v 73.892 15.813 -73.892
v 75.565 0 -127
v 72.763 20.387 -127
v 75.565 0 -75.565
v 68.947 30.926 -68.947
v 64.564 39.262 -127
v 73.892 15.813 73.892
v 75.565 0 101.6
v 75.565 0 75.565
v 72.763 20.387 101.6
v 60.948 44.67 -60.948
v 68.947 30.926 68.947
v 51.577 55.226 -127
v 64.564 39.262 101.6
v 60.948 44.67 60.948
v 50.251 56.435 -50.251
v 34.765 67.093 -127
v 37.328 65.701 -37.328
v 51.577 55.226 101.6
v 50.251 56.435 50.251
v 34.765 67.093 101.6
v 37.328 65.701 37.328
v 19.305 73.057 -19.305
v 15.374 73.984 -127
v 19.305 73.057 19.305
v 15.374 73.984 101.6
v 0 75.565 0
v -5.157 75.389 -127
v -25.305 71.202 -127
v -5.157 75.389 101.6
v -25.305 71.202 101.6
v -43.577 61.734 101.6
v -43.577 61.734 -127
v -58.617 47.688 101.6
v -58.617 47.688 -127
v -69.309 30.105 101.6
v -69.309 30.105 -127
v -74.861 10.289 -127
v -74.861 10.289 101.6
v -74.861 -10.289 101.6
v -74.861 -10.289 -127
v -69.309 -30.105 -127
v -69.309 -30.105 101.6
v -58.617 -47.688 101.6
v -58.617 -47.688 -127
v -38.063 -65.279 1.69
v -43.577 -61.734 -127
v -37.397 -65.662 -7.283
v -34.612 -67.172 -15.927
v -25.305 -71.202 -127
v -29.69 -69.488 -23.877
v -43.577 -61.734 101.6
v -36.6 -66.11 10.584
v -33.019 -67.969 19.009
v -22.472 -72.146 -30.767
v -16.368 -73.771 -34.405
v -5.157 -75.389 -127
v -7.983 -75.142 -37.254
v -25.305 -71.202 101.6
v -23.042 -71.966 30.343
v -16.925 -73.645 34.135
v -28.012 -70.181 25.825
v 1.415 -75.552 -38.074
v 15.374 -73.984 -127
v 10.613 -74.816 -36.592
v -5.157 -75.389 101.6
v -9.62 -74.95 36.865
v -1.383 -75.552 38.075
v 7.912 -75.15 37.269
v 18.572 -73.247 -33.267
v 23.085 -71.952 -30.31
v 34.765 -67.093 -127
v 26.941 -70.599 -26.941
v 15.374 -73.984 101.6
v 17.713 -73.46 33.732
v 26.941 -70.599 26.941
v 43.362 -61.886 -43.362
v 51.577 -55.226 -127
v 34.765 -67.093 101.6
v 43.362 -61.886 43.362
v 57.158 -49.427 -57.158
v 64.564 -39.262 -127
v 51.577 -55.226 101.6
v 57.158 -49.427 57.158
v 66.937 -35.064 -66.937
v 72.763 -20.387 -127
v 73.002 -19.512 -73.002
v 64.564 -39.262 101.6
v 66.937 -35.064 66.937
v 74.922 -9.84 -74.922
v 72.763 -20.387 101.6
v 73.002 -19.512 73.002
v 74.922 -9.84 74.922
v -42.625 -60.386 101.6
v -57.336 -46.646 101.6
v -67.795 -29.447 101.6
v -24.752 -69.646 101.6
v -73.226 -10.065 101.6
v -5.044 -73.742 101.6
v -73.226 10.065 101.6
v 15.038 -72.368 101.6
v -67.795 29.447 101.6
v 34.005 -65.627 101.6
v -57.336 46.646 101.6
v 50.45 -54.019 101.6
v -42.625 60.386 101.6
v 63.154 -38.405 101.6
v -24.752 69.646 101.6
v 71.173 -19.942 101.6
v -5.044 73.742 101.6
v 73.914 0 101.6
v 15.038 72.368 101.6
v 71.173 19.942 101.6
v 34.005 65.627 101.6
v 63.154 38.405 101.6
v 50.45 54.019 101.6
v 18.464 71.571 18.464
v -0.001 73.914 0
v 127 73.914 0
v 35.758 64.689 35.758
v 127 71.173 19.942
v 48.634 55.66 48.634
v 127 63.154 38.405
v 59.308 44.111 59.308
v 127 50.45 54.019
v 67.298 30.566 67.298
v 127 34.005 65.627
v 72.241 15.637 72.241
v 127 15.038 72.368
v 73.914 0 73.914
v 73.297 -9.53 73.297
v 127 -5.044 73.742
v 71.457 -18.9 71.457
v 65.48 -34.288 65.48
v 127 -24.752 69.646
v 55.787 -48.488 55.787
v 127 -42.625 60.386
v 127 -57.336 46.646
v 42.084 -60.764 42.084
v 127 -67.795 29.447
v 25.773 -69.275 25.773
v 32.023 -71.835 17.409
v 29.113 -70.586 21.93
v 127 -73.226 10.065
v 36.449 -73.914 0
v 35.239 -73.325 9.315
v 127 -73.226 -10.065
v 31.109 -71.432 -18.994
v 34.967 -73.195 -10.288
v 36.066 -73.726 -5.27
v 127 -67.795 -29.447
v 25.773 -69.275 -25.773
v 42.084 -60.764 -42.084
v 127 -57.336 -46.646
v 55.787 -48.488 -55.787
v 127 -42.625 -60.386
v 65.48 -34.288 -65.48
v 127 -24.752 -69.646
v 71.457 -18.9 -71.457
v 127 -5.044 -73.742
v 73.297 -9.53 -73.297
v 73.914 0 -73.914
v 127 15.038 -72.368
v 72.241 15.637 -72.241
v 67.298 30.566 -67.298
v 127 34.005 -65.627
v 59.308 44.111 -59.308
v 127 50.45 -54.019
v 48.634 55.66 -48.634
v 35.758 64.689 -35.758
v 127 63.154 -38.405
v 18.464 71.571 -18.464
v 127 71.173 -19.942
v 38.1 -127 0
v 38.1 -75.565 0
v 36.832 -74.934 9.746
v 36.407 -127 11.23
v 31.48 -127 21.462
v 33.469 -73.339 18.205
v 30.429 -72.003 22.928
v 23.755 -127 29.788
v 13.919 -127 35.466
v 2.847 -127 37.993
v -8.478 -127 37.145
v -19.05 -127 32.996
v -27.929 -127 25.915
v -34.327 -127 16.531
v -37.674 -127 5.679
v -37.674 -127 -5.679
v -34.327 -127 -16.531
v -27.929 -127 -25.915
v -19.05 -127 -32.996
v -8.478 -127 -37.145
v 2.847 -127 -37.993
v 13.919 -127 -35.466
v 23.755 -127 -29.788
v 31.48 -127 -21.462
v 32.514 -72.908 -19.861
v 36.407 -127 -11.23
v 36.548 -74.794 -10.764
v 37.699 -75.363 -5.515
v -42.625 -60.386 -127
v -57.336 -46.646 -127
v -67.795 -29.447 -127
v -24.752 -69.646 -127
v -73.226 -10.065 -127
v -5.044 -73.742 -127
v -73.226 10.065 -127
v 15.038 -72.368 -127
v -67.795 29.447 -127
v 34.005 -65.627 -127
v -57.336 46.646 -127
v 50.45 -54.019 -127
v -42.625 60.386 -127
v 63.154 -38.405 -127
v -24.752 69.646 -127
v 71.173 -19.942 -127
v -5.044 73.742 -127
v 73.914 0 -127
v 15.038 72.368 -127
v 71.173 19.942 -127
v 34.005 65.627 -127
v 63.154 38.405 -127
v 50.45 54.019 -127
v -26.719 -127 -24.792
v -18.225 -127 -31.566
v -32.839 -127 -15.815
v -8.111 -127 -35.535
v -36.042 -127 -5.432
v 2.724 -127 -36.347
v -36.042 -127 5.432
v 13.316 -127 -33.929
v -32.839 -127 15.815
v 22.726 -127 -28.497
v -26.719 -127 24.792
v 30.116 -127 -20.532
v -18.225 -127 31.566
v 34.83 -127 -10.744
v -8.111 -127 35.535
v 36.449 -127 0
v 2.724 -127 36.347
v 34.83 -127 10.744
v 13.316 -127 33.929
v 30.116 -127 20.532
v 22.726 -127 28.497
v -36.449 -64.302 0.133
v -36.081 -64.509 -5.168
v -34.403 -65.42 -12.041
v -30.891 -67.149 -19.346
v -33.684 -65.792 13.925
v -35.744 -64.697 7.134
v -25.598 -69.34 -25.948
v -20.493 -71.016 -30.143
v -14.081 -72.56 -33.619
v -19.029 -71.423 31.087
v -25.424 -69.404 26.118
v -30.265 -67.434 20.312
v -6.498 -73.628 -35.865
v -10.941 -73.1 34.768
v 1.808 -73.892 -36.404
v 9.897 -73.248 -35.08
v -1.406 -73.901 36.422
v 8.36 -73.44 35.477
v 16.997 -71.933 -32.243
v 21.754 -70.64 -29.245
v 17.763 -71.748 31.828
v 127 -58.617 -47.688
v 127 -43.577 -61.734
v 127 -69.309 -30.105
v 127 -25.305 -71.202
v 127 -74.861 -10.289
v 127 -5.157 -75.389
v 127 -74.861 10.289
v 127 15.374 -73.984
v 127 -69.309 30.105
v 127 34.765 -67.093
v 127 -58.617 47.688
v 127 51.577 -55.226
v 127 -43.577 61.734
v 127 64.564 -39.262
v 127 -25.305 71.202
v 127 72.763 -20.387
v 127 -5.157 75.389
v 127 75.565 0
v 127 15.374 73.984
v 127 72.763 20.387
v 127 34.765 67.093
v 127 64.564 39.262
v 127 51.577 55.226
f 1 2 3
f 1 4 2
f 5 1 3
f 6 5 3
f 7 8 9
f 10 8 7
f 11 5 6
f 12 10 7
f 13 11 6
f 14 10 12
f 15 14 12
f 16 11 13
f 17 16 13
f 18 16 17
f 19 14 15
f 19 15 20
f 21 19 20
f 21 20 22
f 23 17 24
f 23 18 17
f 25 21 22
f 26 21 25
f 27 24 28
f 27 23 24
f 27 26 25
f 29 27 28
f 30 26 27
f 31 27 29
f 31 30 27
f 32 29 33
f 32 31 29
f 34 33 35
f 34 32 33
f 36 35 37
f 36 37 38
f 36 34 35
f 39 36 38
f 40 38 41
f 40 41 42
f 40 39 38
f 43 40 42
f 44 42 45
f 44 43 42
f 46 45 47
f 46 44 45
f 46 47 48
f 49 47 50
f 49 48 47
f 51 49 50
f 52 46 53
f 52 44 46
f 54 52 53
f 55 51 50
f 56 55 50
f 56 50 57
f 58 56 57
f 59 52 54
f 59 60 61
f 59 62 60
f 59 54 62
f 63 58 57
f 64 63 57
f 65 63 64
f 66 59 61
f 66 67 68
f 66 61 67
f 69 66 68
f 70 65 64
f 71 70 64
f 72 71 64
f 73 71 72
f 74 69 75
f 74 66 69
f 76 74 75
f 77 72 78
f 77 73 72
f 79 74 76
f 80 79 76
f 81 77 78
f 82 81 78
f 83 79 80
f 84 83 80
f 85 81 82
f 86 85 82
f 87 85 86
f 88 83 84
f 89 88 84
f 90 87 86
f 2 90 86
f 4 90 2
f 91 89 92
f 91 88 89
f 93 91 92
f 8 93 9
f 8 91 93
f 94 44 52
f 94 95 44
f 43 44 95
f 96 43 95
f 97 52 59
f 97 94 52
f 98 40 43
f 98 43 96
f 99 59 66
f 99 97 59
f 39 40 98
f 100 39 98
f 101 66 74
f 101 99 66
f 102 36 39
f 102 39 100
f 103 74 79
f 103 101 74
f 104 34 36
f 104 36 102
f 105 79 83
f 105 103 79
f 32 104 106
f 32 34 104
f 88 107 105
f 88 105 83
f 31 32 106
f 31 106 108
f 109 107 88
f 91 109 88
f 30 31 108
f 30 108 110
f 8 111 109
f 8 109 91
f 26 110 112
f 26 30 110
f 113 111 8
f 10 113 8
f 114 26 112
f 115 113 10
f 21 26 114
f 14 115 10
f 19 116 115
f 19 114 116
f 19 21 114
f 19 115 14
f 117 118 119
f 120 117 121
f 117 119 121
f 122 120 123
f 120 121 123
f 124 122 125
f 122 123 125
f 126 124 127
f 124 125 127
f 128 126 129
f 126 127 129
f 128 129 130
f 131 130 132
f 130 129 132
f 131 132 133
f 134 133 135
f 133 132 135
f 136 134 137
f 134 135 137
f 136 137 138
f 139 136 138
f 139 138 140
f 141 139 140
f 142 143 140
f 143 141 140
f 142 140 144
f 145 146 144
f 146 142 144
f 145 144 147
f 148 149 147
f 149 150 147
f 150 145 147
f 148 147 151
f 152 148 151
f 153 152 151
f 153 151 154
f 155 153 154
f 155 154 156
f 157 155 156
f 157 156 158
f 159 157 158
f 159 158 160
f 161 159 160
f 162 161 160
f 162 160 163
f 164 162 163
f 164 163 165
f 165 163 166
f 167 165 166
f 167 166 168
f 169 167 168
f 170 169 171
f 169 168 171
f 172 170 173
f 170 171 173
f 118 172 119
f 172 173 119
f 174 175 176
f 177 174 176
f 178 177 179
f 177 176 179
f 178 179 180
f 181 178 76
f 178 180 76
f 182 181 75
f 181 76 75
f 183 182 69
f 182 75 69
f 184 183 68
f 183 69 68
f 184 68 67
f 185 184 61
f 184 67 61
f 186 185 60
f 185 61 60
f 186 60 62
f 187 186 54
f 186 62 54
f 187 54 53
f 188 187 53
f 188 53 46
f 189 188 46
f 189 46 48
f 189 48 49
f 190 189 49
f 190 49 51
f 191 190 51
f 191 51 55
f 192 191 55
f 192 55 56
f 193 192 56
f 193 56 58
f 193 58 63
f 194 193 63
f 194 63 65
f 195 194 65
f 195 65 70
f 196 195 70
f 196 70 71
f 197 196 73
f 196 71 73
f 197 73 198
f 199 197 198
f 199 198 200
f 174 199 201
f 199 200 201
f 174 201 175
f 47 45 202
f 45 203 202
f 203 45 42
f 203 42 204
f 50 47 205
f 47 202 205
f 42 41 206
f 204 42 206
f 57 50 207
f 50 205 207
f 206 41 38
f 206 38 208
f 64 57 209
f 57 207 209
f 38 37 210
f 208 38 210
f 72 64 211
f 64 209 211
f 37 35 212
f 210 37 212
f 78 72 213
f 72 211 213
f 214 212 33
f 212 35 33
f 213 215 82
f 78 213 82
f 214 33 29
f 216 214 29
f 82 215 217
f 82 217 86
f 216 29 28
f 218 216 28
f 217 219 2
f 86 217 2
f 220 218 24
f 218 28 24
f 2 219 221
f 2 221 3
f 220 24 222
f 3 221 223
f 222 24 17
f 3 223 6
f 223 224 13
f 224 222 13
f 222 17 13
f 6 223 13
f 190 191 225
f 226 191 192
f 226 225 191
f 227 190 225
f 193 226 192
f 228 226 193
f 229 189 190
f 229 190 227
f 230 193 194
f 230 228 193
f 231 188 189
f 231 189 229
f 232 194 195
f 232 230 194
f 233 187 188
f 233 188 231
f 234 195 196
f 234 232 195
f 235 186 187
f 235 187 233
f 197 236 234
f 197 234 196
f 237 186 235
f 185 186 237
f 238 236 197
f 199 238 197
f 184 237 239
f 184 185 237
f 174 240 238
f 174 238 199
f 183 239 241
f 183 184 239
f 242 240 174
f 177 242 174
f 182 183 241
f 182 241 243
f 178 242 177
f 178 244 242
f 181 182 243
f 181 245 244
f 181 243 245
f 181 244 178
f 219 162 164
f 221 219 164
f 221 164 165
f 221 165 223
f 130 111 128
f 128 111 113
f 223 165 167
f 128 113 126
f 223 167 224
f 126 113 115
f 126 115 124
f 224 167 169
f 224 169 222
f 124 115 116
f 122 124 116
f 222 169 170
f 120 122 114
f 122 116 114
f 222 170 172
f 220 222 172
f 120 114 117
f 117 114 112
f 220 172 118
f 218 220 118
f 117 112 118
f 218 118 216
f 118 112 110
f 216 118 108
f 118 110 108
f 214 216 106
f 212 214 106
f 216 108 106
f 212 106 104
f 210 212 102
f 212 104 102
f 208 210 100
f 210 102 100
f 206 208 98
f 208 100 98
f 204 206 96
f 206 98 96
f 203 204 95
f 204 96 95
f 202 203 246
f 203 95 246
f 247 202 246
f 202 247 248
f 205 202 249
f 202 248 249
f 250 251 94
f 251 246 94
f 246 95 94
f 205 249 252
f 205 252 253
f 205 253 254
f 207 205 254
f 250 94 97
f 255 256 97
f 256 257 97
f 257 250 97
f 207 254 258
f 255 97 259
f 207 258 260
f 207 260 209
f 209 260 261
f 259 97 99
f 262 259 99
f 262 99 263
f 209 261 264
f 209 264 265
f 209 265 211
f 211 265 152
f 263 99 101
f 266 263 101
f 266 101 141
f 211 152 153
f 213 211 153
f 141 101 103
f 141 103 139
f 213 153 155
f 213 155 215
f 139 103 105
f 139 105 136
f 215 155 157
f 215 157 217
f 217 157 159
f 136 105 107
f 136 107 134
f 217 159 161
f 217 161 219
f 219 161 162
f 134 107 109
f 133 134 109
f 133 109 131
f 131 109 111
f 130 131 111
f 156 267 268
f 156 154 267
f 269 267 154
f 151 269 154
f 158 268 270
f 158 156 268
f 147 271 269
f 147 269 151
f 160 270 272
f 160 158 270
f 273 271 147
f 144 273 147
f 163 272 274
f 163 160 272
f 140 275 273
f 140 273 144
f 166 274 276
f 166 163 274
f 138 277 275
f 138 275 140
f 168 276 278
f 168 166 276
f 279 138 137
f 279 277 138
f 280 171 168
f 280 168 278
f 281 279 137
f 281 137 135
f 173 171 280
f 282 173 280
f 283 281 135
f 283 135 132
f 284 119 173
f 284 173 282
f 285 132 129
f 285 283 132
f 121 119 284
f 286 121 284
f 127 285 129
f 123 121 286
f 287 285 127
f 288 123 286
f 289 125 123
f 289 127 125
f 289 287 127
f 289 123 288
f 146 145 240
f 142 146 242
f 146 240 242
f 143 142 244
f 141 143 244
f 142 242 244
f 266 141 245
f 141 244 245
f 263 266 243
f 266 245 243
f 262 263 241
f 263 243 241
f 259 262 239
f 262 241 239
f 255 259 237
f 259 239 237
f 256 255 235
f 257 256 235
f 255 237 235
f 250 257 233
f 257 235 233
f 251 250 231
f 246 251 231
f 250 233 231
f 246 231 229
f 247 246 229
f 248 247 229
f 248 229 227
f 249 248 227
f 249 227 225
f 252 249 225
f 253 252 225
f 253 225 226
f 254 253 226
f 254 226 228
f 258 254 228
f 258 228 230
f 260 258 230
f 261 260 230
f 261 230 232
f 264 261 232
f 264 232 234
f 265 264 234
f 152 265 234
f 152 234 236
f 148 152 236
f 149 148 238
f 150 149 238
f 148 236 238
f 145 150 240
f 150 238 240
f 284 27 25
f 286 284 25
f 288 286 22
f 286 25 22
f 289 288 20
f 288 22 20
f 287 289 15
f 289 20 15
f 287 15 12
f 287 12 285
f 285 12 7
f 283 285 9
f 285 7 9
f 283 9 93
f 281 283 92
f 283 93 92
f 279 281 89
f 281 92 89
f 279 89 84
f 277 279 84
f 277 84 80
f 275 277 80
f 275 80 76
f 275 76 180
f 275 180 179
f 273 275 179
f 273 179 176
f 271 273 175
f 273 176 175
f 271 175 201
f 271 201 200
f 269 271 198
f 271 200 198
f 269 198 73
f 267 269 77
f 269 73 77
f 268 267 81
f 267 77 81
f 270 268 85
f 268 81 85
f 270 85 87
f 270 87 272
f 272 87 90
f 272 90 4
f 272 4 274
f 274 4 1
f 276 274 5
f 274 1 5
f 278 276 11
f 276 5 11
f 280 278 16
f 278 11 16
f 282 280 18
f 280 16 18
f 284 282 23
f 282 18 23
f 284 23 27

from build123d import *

# Parameters (mm, degrees)
F0_R      = 75.565
F1_DEPTH  = 101.6
F2_DEPTH  = 127
F3_R      = 38.1
F4_DEPTH  = 127
F5_R      = 75.565
F6_DEPTH  = 127
F7_R      = 73.914
F8_DEPTH  = 228.6010001
F9_R      = 73.914
F10_DEPTH = 127.001
F11_R     = 36.449
F12_DEPTH = 62.6989799529


with BuildPart() as f1:
    # F0 (on Top) → F1 (new body)
    with BuildSketch(Plane.XY):
        Circle(F0_R)
    extrude(amount=F1_DEPTH)

    # F0 (on Top) → F2 (join)
    with BuildSketch(Plane.XY):
        Circle(F0_R)
    extrude(amount=-F2_DEPTH)

    # F3 (on Front) → F4 (join)
    with BuildSketch(Plane.XZ):
        Circle(F3_R)
    extrude(amount=F4_DEPTH)

    # F5 (on Right) → F6 (join)
    with BuildSketch(Plane.YZ):
        Circle(F5_R)
    extrude(amount=F6_DEPTH)

    # F7 (on face) → F8 (cut, through all)
    with BuildSketch(Plane.XY.offset(101.6)):
        Circle(F7_R)
    extrude(amount=-F8_DEPTH, mode=Mode.SUBTRACT)

    # F9 (on face) → F10 (cut, through all)
    with BuildSketch(Plane.YZ.offset(127)):
        Circle(F9_R)
    extrude(amount=-F10_DEPTH, mode=Mode.SUBTRACT)

    # F11 (on face) → F12 (cut, through all)
    with BuildSketch(Plane.XZ.offset(127)):
        Circle(F11_R)
    extrude(amount=-F12_DEPTH, mode=Mode.SUBTRACT)


solid = f1.part
